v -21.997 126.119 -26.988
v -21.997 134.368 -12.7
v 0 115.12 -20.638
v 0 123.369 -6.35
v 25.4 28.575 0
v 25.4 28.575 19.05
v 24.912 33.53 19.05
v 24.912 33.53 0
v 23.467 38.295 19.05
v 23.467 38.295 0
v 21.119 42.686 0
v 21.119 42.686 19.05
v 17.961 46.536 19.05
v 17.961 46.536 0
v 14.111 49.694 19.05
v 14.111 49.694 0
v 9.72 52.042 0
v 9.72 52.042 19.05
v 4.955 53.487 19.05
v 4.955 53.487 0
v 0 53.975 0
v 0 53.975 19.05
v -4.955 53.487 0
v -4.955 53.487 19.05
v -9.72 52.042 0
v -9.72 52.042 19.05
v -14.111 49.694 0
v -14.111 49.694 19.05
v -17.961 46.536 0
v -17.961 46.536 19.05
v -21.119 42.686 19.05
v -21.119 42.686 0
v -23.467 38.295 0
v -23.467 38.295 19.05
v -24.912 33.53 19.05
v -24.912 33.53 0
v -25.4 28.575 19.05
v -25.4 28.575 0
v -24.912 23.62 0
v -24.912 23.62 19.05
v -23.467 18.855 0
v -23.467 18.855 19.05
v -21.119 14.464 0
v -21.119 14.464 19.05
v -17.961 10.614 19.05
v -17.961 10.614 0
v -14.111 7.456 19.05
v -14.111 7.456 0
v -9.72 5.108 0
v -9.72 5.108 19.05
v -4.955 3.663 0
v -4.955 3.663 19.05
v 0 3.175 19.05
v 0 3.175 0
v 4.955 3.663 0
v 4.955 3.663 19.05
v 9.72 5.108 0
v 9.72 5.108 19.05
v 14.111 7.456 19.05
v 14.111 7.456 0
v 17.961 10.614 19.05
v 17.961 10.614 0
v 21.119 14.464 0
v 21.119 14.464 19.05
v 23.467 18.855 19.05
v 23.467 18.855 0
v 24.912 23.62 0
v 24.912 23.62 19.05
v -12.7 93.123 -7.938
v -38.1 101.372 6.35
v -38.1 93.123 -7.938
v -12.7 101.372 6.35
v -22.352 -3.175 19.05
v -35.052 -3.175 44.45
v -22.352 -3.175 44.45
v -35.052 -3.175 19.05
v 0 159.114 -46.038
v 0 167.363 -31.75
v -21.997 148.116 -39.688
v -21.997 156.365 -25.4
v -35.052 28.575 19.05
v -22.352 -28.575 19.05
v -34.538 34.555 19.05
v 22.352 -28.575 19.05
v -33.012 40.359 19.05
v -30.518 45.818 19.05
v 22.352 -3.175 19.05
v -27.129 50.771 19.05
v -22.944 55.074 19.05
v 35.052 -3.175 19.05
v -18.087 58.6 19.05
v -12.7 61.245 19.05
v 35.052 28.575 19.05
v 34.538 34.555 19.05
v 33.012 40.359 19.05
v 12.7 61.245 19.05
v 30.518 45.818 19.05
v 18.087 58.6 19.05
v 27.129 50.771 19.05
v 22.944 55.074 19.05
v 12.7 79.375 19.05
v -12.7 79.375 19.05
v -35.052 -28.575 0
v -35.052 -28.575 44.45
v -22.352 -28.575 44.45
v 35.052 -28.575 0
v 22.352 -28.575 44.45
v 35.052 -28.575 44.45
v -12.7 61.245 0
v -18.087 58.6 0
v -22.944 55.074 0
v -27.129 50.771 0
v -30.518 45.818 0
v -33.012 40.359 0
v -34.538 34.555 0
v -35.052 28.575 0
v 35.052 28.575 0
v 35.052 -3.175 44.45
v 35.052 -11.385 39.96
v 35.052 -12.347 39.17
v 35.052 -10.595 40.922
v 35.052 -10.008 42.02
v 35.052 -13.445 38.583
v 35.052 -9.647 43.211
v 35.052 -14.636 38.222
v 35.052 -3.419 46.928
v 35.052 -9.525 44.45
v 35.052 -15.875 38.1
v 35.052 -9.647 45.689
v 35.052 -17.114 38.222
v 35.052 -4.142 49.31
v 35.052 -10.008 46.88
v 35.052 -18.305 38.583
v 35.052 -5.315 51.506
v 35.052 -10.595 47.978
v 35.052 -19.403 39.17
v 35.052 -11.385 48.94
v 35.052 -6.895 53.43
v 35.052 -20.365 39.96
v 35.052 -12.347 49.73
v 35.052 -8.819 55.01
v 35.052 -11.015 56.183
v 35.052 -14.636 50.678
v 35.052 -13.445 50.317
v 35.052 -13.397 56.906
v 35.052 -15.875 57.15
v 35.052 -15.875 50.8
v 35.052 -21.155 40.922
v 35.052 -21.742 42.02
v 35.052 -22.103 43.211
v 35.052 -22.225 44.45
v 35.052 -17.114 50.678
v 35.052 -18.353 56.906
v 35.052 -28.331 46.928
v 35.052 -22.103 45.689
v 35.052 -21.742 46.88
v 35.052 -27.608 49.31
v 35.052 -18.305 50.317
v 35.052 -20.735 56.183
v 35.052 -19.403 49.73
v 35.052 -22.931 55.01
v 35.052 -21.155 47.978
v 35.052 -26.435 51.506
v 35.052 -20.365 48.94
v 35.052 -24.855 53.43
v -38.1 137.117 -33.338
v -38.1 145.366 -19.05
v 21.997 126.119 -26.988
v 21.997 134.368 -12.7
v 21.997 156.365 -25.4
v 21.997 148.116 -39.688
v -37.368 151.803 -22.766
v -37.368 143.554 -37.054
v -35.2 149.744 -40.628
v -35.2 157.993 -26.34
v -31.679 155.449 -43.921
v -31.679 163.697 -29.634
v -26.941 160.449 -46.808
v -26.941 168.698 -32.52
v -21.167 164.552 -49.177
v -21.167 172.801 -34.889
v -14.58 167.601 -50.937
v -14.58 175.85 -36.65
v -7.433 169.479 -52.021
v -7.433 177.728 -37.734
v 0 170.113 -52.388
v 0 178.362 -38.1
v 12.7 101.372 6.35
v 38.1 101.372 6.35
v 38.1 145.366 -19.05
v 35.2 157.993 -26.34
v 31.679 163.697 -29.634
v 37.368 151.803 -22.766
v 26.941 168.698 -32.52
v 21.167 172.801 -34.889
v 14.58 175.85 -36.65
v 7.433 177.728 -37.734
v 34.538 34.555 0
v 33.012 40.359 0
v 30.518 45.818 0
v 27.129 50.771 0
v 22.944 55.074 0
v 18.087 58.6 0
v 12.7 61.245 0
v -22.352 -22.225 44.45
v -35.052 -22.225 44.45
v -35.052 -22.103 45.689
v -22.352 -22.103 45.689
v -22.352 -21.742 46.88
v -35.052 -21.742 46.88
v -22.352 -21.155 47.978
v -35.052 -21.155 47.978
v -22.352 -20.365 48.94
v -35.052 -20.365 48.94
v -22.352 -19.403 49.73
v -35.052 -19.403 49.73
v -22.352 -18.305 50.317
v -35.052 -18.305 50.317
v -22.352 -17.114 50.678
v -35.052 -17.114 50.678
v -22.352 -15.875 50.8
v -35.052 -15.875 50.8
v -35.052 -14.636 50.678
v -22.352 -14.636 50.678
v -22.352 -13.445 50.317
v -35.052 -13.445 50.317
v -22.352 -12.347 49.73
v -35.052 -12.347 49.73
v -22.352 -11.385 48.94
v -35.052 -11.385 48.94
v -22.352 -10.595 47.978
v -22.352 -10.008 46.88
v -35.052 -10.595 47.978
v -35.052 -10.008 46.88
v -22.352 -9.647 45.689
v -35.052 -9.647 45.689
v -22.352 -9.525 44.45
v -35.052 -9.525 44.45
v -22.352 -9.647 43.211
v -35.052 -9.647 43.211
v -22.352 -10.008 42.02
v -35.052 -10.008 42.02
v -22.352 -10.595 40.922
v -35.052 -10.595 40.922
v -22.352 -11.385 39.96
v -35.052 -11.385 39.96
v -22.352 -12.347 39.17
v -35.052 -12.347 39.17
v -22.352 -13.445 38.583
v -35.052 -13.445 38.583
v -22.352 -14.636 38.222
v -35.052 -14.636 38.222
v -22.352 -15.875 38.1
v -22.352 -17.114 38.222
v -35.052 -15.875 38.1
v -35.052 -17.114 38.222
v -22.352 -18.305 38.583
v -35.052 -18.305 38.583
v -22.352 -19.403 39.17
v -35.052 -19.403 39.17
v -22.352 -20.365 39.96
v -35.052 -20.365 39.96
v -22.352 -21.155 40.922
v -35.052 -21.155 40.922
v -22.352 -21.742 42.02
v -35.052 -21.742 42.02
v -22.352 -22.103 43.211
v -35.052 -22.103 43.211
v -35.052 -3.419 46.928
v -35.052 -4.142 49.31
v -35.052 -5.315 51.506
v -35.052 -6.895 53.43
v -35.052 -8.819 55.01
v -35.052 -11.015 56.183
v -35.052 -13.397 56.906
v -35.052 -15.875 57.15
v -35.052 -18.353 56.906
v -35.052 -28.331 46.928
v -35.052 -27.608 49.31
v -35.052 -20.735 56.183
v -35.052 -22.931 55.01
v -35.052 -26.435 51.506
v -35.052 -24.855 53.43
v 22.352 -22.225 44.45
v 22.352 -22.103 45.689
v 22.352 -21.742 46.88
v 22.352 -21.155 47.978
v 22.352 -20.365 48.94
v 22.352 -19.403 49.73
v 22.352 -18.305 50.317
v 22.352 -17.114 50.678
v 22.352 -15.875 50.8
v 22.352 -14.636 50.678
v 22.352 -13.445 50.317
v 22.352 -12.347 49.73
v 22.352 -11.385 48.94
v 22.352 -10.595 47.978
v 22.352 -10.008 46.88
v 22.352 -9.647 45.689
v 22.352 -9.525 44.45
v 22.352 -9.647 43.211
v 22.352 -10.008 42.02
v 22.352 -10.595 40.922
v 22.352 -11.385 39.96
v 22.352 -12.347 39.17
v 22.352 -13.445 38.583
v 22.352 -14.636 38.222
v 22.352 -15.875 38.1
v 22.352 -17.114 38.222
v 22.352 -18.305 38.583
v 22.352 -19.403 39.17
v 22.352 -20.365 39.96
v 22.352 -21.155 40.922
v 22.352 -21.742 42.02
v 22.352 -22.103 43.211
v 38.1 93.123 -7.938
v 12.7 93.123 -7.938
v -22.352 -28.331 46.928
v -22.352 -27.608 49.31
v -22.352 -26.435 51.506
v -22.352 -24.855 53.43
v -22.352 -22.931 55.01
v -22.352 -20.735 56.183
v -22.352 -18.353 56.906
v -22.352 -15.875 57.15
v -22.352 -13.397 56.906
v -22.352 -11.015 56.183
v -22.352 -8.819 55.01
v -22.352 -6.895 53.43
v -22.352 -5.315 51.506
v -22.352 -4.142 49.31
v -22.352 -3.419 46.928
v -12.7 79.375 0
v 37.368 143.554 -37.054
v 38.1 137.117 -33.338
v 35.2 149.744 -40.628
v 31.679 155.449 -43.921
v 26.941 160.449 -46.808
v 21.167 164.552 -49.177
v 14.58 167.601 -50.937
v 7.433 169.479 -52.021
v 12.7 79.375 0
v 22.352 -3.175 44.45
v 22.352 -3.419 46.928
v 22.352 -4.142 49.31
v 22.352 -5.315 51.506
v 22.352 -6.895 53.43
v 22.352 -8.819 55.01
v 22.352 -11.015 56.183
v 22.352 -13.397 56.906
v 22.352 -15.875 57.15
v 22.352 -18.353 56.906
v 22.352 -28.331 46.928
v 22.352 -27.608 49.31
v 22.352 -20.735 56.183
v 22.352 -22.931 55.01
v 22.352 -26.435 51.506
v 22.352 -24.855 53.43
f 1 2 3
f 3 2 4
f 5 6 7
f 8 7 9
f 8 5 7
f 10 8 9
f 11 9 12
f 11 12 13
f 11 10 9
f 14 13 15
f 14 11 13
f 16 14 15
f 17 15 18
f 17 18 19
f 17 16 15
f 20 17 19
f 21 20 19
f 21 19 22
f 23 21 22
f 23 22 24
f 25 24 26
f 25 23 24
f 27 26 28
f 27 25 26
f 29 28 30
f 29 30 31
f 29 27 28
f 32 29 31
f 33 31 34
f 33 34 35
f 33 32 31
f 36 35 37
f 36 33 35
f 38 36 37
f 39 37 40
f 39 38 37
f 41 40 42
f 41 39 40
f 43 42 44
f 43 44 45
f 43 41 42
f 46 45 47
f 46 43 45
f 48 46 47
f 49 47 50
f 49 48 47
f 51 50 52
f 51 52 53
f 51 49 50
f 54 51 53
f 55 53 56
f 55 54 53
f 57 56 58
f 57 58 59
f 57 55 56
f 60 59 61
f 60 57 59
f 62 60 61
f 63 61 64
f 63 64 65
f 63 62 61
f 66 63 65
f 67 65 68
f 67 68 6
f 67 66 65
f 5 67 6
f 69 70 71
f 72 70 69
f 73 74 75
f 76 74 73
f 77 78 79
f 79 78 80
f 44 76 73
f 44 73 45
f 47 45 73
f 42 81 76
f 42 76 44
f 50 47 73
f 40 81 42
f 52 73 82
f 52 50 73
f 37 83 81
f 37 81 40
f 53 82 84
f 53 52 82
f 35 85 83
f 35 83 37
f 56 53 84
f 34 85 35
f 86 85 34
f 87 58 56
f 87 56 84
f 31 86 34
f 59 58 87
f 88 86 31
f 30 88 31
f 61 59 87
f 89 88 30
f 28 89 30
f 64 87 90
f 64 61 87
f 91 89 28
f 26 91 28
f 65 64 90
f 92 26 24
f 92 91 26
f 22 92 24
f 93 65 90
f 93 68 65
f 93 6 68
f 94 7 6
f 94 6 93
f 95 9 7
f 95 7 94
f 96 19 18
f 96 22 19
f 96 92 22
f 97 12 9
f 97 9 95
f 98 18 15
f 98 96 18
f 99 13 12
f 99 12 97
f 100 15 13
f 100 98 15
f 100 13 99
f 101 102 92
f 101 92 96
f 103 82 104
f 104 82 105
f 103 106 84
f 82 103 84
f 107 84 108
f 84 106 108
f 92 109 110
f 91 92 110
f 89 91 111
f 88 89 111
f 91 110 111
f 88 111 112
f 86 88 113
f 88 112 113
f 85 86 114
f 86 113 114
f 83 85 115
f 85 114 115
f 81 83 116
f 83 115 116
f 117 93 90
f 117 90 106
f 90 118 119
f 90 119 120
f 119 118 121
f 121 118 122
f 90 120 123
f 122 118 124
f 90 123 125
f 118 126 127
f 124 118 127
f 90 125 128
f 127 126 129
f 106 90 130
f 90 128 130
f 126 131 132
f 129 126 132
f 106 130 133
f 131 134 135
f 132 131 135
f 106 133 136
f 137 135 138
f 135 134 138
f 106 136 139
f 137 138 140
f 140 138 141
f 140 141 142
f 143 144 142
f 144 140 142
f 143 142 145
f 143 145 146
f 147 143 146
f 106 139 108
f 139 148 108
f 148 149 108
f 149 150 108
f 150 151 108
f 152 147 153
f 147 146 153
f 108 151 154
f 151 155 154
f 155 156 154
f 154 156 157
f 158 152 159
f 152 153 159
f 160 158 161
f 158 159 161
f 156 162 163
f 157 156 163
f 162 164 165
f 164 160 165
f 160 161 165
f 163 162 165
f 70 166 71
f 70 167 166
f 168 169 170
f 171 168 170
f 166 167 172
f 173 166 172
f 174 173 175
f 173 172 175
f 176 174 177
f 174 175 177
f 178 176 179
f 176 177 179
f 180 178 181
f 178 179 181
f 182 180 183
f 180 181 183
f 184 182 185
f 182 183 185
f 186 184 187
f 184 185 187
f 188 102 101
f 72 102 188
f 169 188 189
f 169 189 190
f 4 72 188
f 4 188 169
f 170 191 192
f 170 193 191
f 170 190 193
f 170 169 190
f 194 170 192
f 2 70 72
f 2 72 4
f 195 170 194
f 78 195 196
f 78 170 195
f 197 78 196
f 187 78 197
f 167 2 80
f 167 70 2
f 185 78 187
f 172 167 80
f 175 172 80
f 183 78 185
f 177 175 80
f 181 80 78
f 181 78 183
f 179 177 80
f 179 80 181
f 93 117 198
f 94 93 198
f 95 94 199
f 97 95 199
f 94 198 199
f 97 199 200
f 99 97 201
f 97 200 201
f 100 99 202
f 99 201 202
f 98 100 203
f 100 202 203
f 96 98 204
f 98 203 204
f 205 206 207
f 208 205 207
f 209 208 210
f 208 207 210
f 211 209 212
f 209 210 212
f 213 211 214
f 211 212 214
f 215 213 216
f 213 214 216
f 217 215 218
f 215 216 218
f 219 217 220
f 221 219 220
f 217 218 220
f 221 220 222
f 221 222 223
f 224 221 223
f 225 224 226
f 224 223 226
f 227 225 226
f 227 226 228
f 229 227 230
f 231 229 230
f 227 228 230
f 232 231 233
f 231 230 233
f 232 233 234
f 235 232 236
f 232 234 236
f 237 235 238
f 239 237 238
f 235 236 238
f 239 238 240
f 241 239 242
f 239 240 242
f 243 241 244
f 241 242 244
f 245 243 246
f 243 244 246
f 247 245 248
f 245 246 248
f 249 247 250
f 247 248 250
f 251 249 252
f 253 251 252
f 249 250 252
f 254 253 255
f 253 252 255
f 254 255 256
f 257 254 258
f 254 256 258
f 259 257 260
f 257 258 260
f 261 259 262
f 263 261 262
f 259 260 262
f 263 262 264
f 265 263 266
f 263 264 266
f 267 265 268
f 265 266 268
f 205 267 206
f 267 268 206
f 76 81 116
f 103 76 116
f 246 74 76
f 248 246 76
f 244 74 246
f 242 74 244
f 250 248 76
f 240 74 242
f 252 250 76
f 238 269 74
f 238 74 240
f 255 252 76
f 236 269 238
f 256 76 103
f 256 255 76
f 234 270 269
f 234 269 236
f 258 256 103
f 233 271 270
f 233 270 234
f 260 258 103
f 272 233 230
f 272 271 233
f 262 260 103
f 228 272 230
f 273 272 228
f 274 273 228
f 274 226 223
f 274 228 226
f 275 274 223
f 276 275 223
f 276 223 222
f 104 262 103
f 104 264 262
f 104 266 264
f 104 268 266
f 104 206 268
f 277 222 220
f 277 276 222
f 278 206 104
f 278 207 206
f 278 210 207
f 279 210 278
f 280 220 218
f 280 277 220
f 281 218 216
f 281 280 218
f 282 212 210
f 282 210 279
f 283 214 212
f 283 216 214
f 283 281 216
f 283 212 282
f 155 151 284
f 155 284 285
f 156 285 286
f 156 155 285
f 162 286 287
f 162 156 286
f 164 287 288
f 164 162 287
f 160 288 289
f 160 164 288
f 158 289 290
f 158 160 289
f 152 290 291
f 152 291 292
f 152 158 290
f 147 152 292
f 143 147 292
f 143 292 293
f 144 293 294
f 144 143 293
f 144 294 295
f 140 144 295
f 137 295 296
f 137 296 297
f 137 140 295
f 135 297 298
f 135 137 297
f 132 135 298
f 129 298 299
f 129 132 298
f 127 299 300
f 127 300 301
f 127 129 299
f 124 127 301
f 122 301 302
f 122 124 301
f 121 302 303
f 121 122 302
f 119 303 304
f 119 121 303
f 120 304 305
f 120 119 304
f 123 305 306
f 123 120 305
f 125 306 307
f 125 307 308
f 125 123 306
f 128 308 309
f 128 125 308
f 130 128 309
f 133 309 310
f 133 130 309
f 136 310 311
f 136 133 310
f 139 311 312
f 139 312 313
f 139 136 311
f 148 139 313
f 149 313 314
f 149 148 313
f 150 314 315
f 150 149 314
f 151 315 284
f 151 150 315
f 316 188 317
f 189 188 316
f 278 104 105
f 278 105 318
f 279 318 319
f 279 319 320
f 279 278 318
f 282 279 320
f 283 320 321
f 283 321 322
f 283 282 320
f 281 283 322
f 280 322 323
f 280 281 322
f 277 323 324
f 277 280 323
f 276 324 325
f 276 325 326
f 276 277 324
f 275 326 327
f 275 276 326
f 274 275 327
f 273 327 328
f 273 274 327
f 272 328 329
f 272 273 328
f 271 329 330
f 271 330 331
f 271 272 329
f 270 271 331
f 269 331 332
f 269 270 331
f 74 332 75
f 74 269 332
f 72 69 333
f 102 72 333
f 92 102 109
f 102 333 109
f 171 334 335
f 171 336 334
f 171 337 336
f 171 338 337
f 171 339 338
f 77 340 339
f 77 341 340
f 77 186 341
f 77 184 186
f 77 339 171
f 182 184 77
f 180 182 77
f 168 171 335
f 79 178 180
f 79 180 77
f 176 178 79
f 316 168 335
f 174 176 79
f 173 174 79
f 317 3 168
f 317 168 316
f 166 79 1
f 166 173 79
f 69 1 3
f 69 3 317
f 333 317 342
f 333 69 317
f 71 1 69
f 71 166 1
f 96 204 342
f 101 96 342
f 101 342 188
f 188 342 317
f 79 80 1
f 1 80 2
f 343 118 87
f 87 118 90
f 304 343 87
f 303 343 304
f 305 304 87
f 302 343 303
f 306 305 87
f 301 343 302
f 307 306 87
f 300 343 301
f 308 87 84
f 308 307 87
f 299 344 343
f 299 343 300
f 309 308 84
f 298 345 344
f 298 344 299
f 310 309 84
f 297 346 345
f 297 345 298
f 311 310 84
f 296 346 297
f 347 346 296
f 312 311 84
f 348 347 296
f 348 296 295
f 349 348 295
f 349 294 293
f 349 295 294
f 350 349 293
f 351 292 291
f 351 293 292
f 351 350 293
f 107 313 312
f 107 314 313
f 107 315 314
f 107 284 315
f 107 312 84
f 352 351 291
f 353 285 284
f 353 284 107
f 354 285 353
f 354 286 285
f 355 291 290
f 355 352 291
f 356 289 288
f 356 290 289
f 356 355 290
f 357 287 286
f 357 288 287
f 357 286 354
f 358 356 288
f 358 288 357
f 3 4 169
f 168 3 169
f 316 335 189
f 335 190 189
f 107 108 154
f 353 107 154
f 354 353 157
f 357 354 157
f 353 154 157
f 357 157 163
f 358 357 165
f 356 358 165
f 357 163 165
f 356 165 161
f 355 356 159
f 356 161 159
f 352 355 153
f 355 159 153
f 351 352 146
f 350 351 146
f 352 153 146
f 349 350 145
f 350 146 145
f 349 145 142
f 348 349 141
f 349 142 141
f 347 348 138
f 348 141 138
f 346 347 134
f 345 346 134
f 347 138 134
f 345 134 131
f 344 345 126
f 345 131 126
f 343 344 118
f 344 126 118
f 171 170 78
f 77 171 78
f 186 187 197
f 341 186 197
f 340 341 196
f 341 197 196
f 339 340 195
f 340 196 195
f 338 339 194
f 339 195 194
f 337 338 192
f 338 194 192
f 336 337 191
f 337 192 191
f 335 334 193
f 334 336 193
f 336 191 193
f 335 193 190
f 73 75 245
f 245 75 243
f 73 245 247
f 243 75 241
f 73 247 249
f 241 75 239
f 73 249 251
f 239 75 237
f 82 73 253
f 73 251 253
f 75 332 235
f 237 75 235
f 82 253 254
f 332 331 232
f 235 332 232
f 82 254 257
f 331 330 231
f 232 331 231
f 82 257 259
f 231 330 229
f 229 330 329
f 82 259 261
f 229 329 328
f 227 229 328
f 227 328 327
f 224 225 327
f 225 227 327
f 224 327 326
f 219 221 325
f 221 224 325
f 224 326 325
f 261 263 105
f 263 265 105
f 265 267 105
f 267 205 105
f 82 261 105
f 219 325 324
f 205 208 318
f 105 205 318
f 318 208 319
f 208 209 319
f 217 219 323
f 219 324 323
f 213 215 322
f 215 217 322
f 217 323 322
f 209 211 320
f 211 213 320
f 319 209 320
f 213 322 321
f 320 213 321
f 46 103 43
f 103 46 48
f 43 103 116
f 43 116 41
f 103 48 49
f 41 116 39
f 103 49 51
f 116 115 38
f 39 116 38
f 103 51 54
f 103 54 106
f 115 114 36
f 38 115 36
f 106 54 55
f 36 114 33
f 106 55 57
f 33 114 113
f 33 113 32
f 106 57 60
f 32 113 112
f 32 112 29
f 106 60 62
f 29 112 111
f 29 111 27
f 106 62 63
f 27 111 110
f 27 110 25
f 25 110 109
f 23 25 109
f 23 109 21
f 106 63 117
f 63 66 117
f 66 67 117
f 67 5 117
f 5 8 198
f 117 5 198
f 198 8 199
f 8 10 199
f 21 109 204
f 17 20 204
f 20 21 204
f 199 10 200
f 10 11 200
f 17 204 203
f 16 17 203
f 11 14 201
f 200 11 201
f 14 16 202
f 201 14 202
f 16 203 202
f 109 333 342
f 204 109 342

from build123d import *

# Parameters (mm, degrees)
F0_R          = 25.4
F1_DEPTH      = 19.05
F2_R          = 6.35
F3_DEPTH      = 12.7
F5_DEPTH      = 25.4
F5_DEPTH_BACK = 50.8
F6_W          = 25.4
F6_H          = 25.4
F7_DEPTH      = 25.4
F9_DEPTH      = 115.8426897829


# Not quite as in the source:
# - a pattern or mirror of a feature is missing from the dataset's text; its kind, count and spacing are read off the source's solid


with BuildPart() as f1:
    # F0 (on Top) → F1 (new body)
    with BuildSketch(Plane.XY):
        with BuildLine():
            Line((-35.052, -28.575), (35.052, -28.575))
            Line((35.052, -28.575), (35.052, 28.575))
            ThreePointArc((35.052, 28.575), (28.9292508026, 48.3674518946), (12.7, 61.2453643077))
            Line((12.7, 61.2453643077), (12.7, 79.375))
            Line((12.7, 79.375), (-12.7, 79.375))
            Line((-12.7, 79.375), (-12.7, 61.2453643077))
            ThreePointArc((-12.7, 61.2453643077), (-28.9292508026, 48.3674518946), (-35.052, 28.575))
            Line((-35.052, 28.575), (-35.052, -28.575))
        make_face()
        with Locations((0, 28.575)):
            Circle(F0_R, mode=Mode.SUBTRACT)
    extrude(amount=F1_DEPTH)

    # F2 (on face) → F3 (join)
    with BuildSketch(Plane(origin=(-35.052, 0, 0), x_dir=(0, -1, 0), z_dir=(-1, 0, 0))):
        with BuildLine():
            Line((3.175, 19.05), (28.575, 19.05))
            Line((28.575, 19.05), (28.575, 44.45))
            ThreePointArc((28.575, 44.45), (15.875, 57.15), (3.175, 44.45))
            Line((3.175, 44.45), (3.175, 19.05))
        make_face()
        with Locations((15.875, 44.45)):
            Circle(F2_R, mode=Mode.SUBTRACT)
    f3 = extrude(amount=-F3_DEPTH)

    # F3_copies: F3 across plane
    add(f3.mirror(Plane(origin=(0, 0, 0), x_dir=(0, 0, 1), z_dir=(1, 0, 0))))

    # F4 (on face) → F5 (join, two sides)
    with BuildSketch(Plane(origin=(-12.7, 0, 0), x_dir=(0, -1, 0), z_dir=(-1, 0, 0))) as f5_sk:
        Polygon((-79.375, 0), (-79.375, 19.05), (-178.3617036526, -38.1), (-170.1128116815, -52.3875), align=None)
    extrude(amount=F5_DEPTH)
    extrude(f5_sk.sketch, amount=-F5_DEPTH_BACK)

    # F6 (on face) → F7 (cut)
    with BuildSketch(Plane(origin=(0, 28.092641971, 48.6578832127), x_dir=(1, 0, 0), z_dir=(0, 0.5, 0.8660254038))):
        with Locations((25.4, 71.9157664254)):
            Rectangle(F6_W, F6_H)
        with Locations((-25.4, 71.9157664254)):
            Rectangle(F6_W, F6_H)
        with BuildLine():
            ThreePointArc((-38.1, 135.4157664254), (-26.9407683632, 162.3565347886), (0, 173.5157664254))
            Line((0, 173.5157664254), (-38.1, 173.5157664254))
            Line((-38.1, 173.5157664254), (-38.1, 135.4157664254))
        make_face()
        with BuildLine():
            ThreePointArc((0, 173.5157664254), (26.9407683632, 162.3565347886), (38.1, 135.4157664254))
            Line((38.1, 135.4157664254), (38.1, 173.5157664254))
            Line((38.1, 173.5157664254), (0, 173.5157664254))
        make_face()
    extrude(amount=-F7_DEPTH, mode=Mode.SUBTRACT)

    # F8 (on face) → F9 (cut, through all)
    with BuildSketch(Plane(origin=(0, 28.092641971, 48.6578832127), x_dir=(1, 0, 0), z_dir=(0, 0.5, 0.8660254038))):
        Polygon((21.9970411706, 148.1157664254), (-4.0856e-06, 160.8157664254), (-21.9970493417, 148.1157664254), (-21.9970493417, 122.7157664254), (-4.0856e-06, 110.0157664254), (21.9970411706, 122.7157664254), align=None)
    extrude(amount=-F9_DEPTH, mode=Mode.SUBTRACT)


solid = f1.part
